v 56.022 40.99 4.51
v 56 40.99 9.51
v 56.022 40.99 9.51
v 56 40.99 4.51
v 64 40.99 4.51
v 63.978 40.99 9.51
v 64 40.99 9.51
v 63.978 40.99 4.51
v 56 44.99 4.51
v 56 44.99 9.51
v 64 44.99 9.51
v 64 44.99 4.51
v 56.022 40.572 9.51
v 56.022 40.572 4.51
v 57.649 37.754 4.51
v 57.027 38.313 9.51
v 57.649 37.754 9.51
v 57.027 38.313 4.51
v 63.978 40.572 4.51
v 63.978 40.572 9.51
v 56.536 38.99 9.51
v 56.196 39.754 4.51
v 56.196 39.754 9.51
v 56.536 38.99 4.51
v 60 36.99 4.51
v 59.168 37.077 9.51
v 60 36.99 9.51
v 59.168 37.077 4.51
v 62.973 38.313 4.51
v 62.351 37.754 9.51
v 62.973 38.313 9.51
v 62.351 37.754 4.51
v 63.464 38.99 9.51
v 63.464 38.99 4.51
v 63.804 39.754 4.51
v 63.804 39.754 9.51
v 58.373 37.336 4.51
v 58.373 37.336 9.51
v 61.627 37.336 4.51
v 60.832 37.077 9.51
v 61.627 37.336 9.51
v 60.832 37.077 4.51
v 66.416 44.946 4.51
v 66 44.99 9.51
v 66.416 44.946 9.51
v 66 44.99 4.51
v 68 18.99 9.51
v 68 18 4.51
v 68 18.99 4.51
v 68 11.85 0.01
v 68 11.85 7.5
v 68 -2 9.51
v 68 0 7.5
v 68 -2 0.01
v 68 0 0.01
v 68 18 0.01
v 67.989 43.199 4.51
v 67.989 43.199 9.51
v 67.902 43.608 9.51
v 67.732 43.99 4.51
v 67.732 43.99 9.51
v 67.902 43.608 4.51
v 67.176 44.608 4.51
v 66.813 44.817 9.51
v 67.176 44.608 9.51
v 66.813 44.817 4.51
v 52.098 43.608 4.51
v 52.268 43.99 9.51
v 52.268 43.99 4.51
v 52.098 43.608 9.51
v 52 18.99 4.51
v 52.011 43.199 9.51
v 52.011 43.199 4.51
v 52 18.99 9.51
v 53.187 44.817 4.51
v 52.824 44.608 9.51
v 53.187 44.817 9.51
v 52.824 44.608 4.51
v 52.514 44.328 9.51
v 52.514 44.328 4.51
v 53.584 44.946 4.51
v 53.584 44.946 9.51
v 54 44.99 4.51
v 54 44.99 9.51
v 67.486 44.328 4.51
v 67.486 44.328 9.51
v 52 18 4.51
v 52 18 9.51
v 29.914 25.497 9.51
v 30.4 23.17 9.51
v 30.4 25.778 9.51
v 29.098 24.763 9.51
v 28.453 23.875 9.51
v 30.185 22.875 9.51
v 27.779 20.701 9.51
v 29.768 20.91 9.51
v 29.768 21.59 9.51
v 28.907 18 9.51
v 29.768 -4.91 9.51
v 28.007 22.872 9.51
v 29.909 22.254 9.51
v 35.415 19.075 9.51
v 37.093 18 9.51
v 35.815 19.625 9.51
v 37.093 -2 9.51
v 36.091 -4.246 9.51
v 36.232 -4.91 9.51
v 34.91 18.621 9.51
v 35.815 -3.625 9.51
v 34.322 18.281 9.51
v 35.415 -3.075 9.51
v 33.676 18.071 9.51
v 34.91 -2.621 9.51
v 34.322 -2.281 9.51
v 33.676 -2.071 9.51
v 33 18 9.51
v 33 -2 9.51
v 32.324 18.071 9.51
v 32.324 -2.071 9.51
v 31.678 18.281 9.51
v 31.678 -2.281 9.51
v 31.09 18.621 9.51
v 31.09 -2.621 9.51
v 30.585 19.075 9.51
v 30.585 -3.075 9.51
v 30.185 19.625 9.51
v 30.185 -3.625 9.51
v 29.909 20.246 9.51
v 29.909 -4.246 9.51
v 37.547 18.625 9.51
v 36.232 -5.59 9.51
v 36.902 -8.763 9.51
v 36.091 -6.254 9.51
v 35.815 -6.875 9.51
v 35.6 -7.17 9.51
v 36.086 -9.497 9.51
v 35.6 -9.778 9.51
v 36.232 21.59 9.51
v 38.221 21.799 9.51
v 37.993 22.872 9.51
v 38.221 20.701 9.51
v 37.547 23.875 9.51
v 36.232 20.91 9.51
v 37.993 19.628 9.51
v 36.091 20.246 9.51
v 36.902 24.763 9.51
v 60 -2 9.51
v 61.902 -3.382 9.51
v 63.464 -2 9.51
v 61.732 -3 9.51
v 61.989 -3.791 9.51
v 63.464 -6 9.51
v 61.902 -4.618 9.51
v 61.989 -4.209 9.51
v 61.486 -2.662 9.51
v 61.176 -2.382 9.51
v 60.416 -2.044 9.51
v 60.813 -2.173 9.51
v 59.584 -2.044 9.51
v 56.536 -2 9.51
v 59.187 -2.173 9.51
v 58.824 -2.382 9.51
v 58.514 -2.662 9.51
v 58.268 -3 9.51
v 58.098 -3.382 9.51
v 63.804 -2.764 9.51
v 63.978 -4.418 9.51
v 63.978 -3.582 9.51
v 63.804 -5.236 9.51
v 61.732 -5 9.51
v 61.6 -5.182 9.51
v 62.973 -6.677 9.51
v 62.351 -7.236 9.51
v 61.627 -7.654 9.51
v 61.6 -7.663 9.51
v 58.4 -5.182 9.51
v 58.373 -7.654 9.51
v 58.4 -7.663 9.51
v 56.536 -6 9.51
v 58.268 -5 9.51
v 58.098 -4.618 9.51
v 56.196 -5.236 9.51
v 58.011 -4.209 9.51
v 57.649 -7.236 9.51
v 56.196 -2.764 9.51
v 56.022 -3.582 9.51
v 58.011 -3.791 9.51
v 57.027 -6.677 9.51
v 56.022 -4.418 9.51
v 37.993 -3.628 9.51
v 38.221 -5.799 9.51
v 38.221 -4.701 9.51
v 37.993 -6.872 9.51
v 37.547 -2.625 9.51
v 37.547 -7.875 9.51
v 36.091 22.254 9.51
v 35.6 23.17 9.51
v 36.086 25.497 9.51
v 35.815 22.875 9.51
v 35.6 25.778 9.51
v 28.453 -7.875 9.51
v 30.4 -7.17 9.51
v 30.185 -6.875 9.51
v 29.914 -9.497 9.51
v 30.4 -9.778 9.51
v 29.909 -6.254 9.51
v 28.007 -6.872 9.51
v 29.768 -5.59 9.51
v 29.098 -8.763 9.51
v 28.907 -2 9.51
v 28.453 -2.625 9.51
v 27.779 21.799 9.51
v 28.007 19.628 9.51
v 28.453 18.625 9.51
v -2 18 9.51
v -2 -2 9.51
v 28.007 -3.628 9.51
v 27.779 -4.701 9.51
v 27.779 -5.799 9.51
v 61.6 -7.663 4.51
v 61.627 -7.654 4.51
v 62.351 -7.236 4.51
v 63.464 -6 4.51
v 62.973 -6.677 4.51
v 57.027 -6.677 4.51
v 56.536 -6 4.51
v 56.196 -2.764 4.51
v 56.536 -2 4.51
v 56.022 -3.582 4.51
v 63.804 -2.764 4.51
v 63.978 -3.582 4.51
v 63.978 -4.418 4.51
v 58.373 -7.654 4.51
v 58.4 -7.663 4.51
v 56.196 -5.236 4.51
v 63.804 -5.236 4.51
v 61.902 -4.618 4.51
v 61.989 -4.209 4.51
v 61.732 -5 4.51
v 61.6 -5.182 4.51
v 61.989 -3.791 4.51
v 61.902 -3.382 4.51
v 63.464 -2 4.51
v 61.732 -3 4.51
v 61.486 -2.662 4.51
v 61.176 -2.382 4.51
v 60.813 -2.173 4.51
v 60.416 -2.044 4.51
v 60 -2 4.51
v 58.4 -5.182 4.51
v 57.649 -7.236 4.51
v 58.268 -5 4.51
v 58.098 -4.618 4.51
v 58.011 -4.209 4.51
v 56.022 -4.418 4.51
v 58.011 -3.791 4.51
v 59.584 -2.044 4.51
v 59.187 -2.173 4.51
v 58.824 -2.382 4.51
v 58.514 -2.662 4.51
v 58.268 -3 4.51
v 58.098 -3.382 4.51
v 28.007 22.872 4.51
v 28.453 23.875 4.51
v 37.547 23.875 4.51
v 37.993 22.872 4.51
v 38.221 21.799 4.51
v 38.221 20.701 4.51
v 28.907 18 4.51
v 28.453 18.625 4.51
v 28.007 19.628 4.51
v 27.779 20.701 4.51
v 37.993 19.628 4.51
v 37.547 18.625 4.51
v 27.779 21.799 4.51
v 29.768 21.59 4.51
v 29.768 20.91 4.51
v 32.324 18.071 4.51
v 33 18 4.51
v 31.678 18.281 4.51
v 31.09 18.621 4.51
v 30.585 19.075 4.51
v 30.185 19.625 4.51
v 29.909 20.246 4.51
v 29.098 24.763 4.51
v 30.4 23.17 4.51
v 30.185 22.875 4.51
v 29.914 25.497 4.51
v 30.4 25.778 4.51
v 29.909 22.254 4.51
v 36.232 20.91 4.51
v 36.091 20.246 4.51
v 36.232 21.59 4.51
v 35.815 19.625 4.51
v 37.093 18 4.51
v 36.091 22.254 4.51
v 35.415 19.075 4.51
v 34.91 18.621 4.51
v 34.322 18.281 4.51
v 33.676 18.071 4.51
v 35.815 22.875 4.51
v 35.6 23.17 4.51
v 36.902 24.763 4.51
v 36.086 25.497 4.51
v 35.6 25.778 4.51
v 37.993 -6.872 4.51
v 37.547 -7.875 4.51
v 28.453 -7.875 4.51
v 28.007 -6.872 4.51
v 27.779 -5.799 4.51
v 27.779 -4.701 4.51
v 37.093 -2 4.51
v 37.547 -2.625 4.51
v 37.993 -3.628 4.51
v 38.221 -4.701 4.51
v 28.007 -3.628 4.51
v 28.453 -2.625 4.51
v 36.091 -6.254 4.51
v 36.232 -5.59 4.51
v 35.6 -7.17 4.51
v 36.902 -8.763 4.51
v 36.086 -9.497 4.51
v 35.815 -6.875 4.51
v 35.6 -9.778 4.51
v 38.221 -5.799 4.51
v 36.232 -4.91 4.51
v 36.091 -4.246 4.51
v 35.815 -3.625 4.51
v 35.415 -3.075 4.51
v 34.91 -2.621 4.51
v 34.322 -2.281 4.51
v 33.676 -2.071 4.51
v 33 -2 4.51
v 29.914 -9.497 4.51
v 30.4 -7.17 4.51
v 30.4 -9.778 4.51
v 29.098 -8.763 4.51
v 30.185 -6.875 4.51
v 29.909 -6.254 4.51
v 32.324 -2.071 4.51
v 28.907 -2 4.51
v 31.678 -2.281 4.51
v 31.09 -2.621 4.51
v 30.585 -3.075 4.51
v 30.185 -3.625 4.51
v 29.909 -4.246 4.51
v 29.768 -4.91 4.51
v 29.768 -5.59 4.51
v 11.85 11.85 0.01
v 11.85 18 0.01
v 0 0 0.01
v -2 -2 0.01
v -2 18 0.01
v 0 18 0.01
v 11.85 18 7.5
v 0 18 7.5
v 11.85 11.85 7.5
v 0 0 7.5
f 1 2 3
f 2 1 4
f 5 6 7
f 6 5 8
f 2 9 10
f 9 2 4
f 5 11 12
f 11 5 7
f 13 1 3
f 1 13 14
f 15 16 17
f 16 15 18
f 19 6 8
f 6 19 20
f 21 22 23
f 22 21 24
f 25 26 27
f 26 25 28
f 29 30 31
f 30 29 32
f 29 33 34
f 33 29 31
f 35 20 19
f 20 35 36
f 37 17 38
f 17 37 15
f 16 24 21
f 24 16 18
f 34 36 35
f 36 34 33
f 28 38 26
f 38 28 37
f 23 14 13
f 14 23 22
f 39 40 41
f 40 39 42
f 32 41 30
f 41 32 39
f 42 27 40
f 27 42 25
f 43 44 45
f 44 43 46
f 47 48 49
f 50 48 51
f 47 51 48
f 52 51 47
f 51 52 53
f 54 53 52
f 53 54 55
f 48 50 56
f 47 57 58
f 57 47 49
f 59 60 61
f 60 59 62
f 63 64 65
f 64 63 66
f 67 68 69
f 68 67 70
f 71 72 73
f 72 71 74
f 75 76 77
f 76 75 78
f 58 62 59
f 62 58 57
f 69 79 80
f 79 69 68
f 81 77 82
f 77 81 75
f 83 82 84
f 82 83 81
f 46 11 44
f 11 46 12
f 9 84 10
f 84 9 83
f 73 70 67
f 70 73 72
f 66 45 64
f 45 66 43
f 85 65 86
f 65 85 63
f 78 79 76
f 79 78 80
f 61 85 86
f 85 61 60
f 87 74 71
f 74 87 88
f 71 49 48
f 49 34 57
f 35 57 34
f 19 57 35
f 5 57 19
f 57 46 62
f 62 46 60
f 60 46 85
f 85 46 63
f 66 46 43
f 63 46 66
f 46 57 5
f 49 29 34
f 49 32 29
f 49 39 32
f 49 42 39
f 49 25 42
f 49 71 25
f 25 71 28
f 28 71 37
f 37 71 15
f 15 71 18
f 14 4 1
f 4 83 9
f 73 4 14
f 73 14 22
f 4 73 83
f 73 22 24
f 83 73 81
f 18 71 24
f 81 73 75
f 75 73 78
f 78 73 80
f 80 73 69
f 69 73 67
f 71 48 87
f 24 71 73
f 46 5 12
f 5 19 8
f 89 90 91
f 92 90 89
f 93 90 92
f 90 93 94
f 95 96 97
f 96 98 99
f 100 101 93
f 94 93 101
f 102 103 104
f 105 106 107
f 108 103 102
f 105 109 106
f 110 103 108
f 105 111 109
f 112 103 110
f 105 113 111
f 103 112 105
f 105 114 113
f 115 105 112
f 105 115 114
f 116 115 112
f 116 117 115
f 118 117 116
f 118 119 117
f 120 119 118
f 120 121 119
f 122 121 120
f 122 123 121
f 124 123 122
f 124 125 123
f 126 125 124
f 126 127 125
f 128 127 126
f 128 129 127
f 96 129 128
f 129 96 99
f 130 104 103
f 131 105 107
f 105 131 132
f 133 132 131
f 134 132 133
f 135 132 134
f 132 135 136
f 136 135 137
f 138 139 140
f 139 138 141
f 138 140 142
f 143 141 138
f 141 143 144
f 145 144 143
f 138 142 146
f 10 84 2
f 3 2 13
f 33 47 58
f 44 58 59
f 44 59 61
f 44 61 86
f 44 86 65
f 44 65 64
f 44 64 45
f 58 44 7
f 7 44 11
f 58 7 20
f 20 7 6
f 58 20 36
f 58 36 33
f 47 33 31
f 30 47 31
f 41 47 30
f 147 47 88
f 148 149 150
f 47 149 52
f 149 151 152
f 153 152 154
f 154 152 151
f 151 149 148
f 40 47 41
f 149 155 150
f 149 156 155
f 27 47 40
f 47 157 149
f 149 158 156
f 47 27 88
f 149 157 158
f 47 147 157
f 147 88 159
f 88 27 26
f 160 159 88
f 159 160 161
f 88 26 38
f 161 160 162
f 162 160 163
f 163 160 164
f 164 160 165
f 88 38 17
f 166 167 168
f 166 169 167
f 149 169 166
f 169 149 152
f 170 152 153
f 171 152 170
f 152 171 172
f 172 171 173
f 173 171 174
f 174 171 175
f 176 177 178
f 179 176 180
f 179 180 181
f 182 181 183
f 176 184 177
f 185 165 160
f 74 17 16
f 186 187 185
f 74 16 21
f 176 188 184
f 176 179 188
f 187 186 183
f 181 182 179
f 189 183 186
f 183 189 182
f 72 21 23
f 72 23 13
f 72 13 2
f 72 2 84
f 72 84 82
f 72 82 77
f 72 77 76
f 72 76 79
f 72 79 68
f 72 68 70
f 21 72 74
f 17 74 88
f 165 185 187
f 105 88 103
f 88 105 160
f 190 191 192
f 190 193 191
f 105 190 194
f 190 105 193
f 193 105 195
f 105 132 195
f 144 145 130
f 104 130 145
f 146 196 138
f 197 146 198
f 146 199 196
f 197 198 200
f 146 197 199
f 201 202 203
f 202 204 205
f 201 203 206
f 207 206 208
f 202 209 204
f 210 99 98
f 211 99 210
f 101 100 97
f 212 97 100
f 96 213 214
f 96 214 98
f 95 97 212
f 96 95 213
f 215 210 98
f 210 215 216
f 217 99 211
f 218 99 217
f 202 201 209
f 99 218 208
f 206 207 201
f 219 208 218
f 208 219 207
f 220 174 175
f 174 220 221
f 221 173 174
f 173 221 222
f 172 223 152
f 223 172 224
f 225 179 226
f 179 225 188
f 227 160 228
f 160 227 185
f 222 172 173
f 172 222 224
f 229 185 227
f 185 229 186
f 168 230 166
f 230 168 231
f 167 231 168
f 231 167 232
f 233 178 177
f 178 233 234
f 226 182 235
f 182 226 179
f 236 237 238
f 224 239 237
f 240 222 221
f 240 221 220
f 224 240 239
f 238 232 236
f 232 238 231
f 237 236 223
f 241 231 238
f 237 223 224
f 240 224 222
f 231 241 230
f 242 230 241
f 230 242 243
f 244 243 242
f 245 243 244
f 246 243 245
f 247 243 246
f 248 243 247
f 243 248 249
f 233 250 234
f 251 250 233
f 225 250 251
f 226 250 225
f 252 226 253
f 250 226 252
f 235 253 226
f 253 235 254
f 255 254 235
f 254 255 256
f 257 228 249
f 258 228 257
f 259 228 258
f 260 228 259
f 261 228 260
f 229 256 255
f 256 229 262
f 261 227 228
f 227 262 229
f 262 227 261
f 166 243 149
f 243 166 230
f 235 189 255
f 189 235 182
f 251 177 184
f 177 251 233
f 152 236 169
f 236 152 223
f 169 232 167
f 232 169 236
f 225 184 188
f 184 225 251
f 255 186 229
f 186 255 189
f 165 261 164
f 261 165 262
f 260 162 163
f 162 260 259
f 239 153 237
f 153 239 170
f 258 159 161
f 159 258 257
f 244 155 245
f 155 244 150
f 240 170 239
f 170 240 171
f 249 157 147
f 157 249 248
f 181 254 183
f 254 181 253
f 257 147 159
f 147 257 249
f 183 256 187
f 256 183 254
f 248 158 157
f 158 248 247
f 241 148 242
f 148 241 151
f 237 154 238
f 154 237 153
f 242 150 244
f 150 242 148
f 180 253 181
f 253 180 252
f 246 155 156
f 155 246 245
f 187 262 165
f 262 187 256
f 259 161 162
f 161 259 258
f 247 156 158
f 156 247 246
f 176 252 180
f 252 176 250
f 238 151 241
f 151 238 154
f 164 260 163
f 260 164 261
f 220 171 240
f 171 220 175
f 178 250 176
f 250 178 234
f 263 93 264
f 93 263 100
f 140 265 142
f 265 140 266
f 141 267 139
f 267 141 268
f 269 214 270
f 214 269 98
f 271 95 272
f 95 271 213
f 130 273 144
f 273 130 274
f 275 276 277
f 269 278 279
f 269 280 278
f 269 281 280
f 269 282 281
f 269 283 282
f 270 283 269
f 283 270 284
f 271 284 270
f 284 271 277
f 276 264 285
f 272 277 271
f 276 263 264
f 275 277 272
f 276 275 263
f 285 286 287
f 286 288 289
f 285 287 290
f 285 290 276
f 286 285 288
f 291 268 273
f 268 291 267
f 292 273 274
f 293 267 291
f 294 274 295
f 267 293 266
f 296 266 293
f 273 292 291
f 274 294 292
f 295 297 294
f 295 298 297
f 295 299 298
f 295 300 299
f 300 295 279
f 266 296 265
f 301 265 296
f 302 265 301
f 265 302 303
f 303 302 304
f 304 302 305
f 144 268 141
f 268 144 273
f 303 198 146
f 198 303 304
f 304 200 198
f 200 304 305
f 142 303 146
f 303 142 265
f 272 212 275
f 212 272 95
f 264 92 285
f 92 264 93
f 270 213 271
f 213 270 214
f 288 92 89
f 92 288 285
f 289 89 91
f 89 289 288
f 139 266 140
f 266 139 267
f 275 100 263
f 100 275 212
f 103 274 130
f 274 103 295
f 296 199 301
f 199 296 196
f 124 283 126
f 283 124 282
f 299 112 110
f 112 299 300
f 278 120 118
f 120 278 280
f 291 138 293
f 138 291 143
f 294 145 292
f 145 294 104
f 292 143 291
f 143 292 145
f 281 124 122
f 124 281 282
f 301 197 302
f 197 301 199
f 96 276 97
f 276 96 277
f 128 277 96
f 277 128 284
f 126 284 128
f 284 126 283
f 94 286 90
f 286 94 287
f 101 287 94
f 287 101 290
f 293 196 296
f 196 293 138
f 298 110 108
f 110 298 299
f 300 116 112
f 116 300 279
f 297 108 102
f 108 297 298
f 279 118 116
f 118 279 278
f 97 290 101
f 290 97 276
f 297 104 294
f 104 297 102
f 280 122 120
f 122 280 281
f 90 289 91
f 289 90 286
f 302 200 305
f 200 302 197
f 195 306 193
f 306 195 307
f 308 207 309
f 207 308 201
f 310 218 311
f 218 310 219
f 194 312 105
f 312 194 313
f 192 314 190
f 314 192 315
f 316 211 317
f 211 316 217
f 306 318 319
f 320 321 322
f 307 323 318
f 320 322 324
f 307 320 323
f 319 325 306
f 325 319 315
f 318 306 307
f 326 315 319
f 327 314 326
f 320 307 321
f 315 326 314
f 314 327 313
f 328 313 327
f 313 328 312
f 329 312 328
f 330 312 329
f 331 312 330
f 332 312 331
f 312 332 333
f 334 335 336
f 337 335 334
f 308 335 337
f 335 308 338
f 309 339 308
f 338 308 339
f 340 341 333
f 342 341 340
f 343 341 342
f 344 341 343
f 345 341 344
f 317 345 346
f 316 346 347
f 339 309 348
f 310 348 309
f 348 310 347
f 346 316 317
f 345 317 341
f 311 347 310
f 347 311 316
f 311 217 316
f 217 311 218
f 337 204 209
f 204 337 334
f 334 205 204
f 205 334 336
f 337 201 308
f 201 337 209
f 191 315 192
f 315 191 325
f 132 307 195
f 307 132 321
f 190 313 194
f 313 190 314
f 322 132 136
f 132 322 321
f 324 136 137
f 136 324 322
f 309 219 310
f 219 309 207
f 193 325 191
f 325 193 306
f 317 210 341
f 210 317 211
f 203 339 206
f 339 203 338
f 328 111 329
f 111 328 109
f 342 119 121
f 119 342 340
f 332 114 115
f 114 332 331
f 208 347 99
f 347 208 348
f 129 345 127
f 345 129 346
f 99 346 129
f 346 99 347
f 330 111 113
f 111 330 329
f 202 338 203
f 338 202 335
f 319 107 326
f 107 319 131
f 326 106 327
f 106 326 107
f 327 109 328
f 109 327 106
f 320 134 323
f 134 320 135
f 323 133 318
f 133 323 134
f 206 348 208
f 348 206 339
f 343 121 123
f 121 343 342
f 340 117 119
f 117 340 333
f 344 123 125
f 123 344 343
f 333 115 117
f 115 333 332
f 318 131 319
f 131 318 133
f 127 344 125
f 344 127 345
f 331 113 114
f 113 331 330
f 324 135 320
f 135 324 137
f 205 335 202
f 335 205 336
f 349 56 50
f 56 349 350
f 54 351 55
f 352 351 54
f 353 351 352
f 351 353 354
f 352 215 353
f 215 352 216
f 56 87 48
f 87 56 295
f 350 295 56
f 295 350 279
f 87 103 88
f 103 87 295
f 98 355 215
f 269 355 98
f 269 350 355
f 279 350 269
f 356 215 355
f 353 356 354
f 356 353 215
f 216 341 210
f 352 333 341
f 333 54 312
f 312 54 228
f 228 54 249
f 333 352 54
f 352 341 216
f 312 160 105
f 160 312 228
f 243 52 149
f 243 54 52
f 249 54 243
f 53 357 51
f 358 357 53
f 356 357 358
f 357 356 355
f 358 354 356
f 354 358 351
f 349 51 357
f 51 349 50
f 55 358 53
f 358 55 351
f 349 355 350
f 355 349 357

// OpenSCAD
rim_height = 7.5;
rim_width = 11.85;

bracket_length = 70;
bracket_width = 20;
edge_width = 2;

CUTOUT_LENGTH = 100;

float_switch_plate_length = 23;
float_switch_plate_width = 16;
float_switch_plate_thickness = 5;

switch_cord_diameter = 4;
switch_cord_wall_width = 2;

airline_diameter = 6.5;

// Generic ring for holding a cylindrical object (probe, cord, airline, etc.)
module holder_ring(inner_diameter, wall_width, height)
{
    ring_resolution = 30;

    difference()
    {
        cylinder(r=(inner_diameter / 2) + wall_width, h=height, $fn=ring_resolution);
        translate([0, 0, -0.01])
            cylinder(r=inner_diameter / 2, h=height + 0.02, $fn=ring_resolution);

        // Open up 4/5s of the inner diameter to put the object through
        translate([inner_diameter / 2, 0, height / 2])
            cube([inner_diameter, (inner_diameter * 4) / 5, height * 2], center=true);
    }
}

module float_switch()
{
    float_switch_stem_diameter = 8;
    float_switch_plate_corners = 2;
    
    difference()
    {
        // Holder plate is connected squarely with the bracket and rounded at the ends
        hull()
        {
            cube([1, float_switch_plate_width, float_switch_plate_thickness]);
            translate([float_switch_plate_length * 1 + float_switch_plate_corners, 0])
            {
                translate([0, float_switch_plate_width - float_switch_plate_corners, 0])
                    cylinder(r=float_switch_plate_corners, h=float_switch_plate_thickness, $fn=30);
                translate([0, float_switch_plate_corners, 0])
                    cylinder(r=float_switch_plate_corners, h=float_switch_plate_thickness, $fn=30);
            }
        }

        // Cut out a notch in the front for the stem of the switch
        union()
        {
            translate([float_switch_plate_length, float_switch_plate_width / 4, -0.01])
                cube([float_switch_stem_diameter, float_switch_stem_diameter, float_switch_plate_thickness + 0.02]);
            translate([float_switch_plate_length, float_switch_plate_width / 2, -0.01])
                cylinder(r=float_switch_stem_diameter / 2, h=float_switch_plate_thickness + 0.02, $fn=30);
        }
    }
}

difference()
{
    translate([edge_width * -1, edge_width * -1, 0.01])
    {
        union()
        {
            cube([bracket_length, bracket_width, rim_height + edge_width]);
            
            // Float switch parts: bracket + cord holder
            translate([bracket_length, bracket_width - 0.01, rim_height + edge_width - float_switch_plate_thickness])
                rotate([0, 0, 90])
                    float_switch();
            translate([bracket_length - float_switch_plate_width / 2, -2, rim_height + edge_width - float_switch_plate_thickness])
                rotate([0, 0, -90])
                    holder_ring(switch_cord_diameter, switch_cord_wall_width, float_switch_plate_thickness);
            
            // Topoff line parts: inner and outer holders
            translate([bracket_length * 0.5, bracket_width + airline_diameter / 2, rim_height + edge_width - float_switch_plate_thickness])
                rotate([0, 0, 90])
                    holder_ring(airline_diameter, switch_cord_wall_width, float_switch_plate_thickness);
            
            translate([bracket_length * 0.5, airline_diameter / -2, rim_height + edge_width - float_switch_plate_thickness])
                rotate([0, 0, -90])
                    holder_ring(airline_diameter, switch_cord_wall_width, float_switch_plate_thickness);
        }
    }
    
    union()
    {
        cube([CUTOUT_LENGTH, rim_width, rim_height]);
        translate([rim_width, 0, 0])
        rotate([0, 0, 90])
            cube([CUTOUT_LENGTH, rim_width, rim_height]);
    }
}
